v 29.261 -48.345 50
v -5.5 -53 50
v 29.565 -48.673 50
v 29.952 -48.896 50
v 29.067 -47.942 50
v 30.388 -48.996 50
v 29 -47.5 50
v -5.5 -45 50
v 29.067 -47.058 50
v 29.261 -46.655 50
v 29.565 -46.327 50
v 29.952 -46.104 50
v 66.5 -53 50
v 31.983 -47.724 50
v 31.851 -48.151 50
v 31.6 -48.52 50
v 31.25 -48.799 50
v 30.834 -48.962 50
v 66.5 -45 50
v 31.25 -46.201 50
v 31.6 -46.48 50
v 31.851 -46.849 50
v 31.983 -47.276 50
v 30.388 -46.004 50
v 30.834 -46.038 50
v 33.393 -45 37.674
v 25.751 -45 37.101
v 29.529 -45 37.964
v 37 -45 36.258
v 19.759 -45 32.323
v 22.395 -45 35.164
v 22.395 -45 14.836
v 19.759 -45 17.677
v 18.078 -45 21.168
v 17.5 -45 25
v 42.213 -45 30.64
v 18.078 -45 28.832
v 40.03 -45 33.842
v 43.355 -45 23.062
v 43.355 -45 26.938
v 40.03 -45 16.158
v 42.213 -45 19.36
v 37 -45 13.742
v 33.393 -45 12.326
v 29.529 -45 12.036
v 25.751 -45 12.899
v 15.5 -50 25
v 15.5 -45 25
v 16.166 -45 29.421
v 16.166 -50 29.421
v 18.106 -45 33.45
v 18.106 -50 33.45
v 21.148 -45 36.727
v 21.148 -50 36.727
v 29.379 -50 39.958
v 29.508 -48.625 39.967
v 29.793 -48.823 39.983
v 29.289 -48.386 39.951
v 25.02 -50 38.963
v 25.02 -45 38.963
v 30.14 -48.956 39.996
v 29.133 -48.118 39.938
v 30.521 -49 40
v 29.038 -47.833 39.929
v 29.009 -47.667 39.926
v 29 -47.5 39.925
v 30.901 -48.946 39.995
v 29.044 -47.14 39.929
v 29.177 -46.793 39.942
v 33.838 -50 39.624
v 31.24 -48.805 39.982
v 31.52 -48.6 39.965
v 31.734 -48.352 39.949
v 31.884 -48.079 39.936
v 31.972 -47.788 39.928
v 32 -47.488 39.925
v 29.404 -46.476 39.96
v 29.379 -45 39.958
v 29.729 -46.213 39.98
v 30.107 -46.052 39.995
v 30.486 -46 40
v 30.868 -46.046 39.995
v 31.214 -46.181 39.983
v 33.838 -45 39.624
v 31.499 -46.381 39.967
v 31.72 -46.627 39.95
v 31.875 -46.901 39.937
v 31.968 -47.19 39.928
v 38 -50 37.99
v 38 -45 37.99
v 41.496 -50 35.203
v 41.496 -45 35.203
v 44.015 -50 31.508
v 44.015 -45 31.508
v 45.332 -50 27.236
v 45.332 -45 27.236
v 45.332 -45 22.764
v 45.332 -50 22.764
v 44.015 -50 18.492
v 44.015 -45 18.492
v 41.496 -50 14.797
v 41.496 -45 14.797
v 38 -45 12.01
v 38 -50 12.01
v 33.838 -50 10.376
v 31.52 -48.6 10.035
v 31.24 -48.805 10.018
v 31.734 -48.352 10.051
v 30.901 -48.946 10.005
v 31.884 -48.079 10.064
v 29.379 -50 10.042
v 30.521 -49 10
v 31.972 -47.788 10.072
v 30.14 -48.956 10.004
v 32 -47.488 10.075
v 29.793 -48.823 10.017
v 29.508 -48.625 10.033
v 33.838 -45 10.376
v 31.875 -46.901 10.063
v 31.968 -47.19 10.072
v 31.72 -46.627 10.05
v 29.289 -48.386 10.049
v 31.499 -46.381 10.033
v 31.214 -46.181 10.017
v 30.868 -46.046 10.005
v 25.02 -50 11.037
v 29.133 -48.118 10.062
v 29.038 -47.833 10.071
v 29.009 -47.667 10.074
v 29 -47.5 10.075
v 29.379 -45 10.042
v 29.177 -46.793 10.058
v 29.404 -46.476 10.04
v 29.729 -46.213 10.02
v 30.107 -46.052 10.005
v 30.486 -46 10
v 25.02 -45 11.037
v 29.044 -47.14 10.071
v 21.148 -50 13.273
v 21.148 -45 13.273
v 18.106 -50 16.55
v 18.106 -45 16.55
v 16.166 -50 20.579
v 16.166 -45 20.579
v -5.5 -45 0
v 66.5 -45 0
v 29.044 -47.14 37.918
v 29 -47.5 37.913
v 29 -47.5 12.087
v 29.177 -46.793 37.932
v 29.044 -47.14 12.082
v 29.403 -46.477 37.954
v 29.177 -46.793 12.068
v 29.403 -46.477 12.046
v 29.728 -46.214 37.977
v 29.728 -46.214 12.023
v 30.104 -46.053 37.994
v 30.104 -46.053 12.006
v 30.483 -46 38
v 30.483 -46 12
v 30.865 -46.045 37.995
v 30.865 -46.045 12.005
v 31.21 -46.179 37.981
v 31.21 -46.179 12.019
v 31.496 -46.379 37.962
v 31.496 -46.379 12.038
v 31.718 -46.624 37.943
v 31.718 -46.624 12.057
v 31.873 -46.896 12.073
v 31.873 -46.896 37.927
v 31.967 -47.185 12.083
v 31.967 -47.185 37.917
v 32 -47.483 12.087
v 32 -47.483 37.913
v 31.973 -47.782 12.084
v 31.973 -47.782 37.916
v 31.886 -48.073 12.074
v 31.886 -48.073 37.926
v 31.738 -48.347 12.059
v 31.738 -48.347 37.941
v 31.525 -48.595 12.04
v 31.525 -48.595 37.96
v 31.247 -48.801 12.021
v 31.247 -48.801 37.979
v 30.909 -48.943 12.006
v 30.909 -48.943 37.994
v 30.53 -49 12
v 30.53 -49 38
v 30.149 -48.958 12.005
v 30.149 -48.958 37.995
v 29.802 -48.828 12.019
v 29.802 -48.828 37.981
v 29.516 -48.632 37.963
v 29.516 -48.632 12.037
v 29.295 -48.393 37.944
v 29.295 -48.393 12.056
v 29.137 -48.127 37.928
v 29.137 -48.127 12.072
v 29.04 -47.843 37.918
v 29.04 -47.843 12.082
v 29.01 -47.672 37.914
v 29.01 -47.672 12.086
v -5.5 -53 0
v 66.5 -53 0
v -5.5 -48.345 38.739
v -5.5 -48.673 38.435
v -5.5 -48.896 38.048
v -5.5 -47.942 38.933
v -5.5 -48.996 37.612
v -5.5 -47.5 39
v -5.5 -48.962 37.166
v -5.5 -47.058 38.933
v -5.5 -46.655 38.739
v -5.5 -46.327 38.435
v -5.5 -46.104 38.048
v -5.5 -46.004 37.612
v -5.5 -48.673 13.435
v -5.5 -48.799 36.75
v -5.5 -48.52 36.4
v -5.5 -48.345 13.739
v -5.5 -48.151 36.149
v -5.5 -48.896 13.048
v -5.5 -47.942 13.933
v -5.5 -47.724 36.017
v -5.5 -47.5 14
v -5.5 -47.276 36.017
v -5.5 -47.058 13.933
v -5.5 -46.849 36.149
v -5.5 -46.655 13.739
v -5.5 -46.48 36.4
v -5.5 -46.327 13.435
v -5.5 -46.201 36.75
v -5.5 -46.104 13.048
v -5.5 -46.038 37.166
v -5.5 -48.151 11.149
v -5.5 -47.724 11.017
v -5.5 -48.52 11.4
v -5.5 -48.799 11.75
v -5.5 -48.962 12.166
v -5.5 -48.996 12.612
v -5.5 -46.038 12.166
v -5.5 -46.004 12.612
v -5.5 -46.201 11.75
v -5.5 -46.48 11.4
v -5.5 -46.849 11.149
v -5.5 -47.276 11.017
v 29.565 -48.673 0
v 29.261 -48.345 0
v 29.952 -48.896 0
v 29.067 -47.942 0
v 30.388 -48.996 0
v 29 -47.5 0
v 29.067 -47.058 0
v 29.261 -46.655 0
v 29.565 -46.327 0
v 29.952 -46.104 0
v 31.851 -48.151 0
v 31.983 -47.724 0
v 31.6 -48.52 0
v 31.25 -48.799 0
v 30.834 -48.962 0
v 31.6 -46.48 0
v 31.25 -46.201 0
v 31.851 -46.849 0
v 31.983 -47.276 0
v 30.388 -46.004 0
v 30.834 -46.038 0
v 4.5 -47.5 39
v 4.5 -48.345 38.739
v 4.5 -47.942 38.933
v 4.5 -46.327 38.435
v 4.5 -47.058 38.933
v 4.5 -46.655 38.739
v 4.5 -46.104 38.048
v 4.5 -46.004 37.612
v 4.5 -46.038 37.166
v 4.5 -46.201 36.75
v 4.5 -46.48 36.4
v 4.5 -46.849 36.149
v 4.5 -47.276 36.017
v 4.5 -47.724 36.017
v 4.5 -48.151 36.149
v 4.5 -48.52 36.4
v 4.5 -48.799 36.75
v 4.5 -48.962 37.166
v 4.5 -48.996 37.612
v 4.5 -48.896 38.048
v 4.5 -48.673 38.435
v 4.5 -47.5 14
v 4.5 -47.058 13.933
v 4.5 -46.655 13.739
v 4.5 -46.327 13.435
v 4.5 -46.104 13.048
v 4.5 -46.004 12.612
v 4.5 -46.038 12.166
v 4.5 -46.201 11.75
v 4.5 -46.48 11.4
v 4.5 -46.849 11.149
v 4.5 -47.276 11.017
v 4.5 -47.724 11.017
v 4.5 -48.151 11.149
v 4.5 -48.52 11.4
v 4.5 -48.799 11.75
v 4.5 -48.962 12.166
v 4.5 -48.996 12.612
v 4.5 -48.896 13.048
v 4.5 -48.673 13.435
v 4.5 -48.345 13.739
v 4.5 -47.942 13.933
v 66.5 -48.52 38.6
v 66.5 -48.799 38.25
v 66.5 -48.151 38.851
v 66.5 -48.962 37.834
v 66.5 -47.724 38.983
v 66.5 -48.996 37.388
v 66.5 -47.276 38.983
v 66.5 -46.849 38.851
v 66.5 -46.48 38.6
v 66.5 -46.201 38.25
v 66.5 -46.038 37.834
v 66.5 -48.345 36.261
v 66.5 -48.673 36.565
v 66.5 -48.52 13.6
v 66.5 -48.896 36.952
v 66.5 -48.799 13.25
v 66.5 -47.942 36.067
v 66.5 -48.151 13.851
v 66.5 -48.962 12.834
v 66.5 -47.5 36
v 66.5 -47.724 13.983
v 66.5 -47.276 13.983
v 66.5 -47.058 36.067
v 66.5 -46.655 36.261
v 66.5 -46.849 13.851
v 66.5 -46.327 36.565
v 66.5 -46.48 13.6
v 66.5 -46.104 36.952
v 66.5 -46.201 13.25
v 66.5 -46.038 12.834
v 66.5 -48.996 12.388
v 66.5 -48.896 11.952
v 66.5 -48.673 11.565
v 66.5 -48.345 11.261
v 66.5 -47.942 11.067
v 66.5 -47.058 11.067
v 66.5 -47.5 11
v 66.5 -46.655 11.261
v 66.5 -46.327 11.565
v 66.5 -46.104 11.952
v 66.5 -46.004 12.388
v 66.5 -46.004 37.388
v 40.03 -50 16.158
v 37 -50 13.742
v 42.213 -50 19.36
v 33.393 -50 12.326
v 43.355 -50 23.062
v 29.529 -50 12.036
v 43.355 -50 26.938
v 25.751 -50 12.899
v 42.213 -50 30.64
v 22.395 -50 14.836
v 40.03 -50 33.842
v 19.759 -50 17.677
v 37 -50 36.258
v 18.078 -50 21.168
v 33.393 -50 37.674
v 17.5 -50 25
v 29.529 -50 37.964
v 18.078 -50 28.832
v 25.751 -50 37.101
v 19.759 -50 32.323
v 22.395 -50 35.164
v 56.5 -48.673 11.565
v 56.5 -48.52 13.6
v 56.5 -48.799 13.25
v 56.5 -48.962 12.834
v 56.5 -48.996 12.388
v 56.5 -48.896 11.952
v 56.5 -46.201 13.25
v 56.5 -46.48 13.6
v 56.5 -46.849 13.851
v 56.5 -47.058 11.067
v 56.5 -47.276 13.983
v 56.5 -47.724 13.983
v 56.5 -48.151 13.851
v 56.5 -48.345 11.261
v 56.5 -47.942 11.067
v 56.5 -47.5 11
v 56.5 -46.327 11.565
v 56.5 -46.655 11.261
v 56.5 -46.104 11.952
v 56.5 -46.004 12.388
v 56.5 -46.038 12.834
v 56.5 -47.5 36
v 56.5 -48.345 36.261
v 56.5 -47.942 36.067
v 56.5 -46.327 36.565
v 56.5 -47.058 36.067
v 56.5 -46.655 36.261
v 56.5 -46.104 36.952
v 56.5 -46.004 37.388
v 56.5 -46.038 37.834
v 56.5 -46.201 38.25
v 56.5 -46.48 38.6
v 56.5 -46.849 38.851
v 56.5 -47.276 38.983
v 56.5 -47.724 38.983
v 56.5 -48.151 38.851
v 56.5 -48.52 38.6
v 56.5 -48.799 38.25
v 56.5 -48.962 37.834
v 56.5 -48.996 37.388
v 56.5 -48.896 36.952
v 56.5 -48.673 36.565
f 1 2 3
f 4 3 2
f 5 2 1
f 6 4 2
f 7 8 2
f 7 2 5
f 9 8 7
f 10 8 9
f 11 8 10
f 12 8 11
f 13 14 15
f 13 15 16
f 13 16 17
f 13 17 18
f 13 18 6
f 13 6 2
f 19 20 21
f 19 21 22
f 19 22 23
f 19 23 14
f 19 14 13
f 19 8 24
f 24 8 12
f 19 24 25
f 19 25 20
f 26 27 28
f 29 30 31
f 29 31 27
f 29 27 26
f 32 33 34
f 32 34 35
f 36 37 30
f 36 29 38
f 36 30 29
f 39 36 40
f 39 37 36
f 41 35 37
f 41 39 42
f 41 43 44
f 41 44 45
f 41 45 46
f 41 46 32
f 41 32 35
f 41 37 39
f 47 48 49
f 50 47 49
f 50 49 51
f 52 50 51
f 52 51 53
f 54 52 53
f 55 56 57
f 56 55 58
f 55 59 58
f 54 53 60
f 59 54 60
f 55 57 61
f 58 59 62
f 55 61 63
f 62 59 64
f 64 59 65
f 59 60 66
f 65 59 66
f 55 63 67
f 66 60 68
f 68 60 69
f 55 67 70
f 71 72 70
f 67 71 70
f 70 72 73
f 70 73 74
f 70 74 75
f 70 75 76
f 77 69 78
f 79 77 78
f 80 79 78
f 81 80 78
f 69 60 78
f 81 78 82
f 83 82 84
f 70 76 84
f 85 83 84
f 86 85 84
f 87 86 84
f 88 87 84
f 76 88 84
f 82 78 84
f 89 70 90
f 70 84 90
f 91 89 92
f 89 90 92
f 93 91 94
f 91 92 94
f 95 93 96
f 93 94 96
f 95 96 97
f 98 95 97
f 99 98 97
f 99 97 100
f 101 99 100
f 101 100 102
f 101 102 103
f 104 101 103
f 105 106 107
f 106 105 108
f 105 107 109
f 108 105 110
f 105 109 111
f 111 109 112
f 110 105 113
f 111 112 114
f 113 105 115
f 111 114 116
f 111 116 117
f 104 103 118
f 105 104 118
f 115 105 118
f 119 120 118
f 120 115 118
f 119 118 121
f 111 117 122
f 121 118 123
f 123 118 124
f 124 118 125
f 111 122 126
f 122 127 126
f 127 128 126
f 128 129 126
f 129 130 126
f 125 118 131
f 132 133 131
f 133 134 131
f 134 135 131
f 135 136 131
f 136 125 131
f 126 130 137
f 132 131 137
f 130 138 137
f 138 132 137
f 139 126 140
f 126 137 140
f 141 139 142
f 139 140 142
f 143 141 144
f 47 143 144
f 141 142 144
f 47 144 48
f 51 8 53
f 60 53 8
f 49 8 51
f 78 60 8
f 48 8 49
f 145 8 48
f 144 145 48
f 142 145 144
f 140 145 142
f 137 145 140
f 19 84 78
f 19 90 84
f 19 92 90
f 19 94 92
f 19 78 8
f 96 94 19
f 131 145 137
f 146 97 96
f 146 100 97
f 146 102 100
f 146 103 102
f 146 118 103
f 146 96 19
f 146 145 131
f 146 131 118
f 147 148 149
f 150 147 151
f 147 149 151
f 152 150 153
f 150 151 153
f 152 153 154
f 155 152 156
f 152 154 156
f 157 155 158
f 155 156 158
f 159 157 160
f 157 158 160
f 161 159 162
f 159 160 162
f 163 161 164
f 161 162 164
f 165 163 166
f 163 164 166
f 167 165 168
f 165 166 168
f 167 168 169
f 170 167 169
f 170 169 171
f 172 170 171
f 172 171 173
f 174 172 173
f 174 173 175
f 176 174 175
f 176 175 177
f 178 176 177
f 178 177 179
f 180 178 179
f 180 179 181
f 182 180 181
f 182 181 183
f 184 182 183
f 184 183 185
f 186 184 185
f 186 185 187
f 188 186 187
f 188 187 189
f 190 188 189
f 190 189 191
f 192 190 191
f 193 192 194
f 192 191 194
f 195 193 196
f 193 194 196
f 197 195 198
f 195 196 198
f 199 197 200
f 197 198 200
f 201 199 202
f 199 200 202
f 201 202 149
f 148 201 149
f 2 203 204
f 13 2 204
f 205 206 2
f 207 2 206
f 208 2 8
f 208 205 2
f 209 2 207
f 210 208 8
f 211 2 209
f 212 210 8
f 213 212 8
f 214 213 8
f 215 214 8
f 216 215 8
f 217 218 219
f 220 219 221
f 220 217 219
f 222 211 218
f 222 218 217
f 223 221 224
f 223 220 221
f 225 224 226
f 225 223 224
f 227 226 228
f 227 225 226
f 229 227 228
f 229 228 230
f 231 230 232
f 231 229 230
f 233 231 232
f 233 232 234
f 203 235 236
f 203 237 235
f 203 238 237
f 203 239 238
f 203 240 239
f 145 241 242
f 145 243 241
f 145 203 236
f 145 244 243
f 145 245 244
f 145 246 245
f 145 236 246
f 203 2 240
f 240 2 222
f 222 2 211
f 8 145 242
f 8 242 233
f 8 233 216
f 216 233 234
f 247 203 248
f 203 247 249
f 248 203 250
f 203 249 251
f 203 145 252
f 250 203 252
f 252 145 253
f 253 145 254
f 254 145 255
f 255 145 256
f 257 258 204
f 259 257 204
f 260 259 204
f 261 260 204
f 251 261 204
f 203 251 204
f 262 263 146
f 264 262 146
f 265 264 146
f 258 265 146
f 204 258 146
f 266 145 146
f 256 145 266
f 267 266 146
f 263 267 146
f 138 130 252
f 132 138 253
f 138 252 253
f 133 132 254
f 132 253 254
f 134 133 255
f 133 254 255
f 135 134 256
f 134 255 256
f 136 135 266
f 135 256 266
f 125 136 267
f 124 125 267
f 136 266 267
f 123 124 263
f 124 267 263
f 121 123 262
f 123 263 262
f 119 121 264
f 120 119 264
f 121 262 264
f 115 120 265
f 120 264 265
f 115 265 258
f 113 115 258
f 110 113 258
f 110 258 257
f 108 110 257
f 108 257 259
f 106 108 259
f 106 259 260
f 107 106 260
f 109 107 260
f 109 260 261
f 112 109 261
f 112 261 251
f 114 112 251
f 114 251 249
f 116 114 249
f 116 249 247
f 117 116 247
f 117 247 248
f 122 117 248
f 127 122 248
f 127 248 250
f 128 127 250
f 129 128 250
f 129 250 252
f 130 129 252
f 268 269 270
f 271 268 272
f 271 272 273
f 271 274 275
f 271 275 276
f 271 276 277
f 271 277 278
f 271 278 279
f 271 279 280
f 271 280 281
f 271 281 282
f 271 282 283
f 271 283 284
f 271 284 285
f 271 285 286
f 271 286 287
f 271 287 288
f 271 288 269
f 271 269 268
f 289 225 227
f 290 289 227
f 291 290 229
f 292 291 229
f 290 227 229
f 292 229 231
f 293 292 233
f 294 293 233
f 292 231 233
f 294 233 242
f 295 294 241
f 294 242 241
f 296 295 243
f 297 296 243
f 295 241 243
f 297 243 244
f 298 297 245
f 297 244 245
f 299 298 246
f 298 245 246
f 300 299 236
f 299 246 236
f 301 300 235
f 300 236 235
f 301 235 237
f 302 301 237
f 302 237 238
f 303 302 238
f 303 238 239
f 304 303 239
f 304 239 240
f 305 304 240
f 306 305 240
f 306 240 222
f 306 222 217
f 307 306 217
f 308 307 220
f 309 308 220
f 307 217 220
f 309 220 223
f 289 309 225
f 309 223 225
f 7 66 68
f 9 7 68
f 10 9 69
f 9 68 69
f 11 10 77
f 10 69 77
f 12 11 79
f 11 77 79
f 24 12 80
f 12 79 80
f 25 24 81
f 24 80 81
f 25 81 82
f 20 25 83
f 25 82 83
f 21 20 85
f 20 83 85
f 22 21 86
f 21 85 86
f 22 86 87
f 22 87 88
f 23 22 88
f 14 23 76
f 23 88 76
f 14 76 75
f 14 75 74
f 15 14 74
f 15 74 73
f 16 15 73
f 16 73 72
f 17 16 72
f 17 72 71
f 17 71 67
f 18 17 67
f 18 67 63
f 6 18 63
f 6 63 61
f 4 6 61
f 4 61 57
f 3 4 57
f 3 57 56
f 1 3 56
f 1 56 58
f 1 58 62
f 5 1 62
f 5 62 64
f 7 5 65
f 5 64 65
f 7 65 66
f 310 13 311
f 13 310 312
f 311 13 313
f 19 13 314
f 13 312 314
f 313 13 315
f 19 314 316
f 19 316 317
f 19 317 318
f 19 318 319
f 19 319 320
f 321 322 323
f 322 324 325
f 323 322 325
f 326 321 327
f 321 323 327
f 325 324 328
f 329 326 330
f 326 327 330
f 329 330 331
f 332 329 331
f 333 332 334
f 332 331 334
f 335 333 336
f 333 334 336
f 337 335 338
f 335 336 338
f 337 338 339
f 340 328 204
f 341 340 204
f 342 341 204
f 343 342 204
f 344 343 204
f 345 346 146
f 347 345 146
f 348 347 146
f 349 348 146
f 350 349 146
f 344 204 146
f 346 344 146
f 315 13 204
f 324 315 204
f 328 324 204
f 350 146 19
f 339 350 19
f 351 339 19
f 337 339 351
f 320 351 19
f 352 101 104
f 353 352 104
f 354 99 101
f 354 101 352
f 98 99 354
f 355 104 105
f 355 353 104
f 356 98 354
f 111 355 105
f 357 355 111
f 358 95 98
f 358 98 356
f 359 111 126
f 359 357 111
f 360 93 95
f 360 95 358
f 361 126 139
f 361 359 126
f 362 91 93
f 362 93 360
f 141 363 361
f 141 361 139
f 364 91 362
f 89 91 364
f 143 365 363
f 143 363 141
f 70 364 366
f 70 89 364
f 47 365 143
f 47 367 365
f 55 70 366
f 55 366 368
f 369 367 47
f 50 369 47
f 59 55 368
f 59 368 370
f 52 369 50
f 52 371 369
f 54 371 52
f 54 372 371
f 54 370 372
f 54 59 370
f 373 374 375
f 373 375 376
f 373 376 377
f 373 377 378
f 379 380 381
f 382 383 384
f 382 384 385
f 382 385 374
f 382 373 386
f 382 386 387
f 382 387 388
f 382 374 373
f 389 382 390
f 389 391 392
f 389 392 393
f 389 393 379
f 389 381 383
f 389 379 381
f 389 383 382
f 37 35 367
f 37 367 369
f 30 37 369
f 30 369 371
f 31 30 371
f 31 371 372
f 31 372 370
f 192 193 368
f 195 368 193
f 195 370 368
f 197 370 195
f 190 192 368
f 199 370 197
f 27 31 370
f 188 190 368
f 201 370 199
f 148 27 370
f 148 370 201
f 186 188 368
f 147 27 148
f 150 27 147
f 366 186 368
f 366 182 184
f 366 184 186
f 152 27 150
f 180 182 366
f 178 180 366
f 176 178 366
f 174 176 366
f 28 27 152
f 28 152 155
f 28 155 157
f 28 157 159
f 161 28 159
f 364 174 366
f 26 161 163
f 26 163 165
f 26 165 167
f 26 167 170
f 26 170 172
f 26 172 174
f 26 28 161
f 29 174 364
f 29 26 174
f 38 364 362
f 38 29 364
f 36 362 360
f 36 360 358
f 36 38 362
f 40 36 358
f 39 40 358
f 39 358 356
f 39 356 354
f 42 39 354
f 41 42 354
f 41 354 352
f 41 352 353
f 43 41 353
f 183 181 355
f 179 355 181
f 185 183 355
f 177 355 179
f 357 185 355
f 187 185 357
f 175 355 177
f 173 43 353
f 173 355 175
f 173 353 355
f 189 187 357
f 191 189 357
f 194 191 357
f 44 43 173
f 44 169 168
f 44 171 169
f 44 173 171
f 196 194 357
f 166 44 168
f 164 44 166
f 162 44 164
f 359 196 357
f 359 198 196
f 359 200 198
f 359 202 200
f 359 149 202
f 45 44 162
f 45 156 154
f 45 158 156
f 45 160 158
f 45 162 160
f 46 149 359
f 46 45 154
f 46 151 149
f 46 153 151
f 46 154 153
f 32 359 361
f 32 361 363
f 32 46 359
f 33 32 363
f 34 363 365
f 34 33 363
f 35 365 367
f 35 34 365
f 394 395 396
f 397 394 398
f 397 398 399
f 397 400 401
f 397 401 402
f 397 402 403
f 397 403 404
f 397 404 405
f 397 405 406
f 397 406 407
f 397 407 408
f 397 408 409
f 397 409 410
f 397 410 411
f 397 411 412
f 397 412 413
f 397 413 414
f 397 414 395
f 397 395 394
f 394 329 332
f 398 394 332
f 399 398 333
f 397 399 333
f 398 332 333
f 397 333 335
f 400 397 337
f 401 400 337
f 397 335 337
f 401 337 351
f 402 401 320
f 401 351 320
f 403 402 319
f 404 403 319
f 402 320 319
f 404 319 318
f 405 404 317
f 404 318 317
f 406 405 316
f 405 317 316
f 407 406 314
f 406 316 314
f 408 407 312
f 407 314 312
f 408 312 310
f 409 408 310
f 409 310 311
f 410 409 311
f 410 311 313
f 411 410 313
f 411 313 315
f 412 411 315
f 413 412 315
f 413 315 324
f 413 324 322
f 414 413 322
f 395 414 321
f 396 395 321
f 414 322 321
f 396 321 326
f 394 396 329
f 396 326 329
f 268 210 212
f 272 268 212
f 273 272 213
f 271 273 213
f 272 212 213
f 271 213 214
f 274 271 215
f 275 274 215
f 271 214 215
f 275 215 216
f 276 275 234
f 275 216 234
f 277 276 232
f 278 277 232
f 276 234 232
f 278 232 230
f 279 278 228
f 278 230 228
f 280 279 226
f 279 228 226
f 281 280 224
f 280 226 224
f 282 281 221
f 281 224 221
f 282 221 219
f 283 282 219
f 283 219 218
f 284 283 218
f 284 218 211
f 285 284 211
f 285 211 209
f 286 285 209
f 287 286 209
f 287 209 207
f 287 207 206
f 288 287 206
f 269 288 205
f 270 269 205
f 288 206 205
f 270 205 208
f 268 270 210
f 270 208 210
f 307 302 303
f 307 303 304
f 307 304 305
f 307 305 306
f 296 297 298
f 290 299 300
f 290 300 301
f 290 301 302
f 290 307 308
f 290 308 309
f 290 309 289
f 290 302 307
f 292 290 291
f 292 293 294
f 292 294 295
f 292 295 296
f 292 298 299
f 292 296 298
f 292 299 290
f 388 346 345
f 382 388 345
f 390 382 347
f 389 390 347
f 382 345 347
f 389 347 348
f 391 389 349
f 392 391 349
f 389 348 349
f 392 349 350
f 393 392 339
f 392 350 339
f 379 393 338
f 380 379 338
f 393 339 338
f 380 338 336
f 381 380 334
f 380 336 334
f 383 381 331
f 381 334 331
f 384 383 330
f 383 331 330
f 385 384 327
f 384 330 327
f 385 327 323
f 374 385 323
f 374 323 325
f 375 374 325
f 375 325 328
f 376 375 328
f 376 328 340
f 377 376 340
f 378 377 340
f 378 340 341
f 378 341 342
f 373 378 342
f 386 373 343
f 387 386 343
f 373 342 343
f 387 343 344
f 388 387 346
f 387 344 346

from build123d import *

# Parameters (mm, degrees)
ESQUISSE1_W             = 72
ESQUISSE1_H             = 8
BOSS_EXTRU_1_DEPTH      = 50
ESQUISSE2_R             = 15
ESQUISSE2_R_2           = 13
ENL_V_MAT_EXTRU_1_DEPTH = 5
ESQUISSE3_R             = 1.5
ENL_V_MAT_EXTRU_2_DEPTH = 10
ESQUISSE4_R             = 1.5
ENL_V_MAT_EXTRU_3_DEPTH = 10
ESQUISSE5_R             = 1.5
ENL_V_MAT_EXTRU_4_DEPTH = 51


with BuildPart() as part:
    # Esquisse1 → Boss.-Extru.1 (new body)
    with BuildSketch(Plane.XY):
        with Locations((30.5, -49)):
            Rectangle(ESQUISSE1_W, ESQUISSE1_H)
    extrude(amount=BOSS_EXTRU_1_DEPTH)

    # Esquisse2 → Enlèv. mat.-Extru.1 (cut)
    with BuildSketch(Plane(origin=(0, -45, 0), x_dir=(-1, 0, 0), z_dir=(0, 1, 0))):
        with Locations((-30.5, 25)):
            Circle(ESQUISSE2_R)
        with Locations((-30.5, 25)):
            Circle(ESQUISSE2_R_2, mode=Mode.SUBTRACT)
    extrude(amount=-ENL_V_MAT_EXTRU_1_DEPTH, mode=Mode.SUBTRACT)

    # Esquisse3 → Enlèv. mat.-Extru.2 (cut)
    with BuildSketch(Plane.ZY.offset(5.5)):
        with Locations((12.5, -47.5)):
            Circle(ESQUISSE3_R)
        with Locations((37.5, -47.5)):
            Circle(ESQUISSE3_R)
    extrude(amount=-ENL_V_MAT_EXTRU_2_DEPTH, mode=Mode.SUBTRACT)

    # Esquisse4 → Enlèv. mat.-Extru.3 (cut)
    with BuildSketch(Plane(origin=(66.5, 0, 0), x_dir=(0, 0, -1), z_dir=(1, 0, 0))):
        with Locations((-37.5, -47.5)):
            Circle(ESQUISSE4_R)
        with Locations((-12.5, -47.5)):
            Circle(ESQUISSE4_R)
    extrude(amount=-ENL_V_MAT_EXTRU_3_DEPTH, mode=Mode.SUBTRACT)

    # Esquisse5 → Enlèv. mat.-Extru.4 (cut, through all)
    with BuildSketch(Plane(origin=(0, 0, 0), x_dir=(-1, 0, 0), z_dir=(0, 0, -1))):
        with Locations((-30.5, -47.5)):
            Circle(ESQUISSE5_R)
    extrude(amount=-ENL_V_MAT_EXTRU_4_DEPTH, mode=Mode.SUBTRACT)


solid = part.part
